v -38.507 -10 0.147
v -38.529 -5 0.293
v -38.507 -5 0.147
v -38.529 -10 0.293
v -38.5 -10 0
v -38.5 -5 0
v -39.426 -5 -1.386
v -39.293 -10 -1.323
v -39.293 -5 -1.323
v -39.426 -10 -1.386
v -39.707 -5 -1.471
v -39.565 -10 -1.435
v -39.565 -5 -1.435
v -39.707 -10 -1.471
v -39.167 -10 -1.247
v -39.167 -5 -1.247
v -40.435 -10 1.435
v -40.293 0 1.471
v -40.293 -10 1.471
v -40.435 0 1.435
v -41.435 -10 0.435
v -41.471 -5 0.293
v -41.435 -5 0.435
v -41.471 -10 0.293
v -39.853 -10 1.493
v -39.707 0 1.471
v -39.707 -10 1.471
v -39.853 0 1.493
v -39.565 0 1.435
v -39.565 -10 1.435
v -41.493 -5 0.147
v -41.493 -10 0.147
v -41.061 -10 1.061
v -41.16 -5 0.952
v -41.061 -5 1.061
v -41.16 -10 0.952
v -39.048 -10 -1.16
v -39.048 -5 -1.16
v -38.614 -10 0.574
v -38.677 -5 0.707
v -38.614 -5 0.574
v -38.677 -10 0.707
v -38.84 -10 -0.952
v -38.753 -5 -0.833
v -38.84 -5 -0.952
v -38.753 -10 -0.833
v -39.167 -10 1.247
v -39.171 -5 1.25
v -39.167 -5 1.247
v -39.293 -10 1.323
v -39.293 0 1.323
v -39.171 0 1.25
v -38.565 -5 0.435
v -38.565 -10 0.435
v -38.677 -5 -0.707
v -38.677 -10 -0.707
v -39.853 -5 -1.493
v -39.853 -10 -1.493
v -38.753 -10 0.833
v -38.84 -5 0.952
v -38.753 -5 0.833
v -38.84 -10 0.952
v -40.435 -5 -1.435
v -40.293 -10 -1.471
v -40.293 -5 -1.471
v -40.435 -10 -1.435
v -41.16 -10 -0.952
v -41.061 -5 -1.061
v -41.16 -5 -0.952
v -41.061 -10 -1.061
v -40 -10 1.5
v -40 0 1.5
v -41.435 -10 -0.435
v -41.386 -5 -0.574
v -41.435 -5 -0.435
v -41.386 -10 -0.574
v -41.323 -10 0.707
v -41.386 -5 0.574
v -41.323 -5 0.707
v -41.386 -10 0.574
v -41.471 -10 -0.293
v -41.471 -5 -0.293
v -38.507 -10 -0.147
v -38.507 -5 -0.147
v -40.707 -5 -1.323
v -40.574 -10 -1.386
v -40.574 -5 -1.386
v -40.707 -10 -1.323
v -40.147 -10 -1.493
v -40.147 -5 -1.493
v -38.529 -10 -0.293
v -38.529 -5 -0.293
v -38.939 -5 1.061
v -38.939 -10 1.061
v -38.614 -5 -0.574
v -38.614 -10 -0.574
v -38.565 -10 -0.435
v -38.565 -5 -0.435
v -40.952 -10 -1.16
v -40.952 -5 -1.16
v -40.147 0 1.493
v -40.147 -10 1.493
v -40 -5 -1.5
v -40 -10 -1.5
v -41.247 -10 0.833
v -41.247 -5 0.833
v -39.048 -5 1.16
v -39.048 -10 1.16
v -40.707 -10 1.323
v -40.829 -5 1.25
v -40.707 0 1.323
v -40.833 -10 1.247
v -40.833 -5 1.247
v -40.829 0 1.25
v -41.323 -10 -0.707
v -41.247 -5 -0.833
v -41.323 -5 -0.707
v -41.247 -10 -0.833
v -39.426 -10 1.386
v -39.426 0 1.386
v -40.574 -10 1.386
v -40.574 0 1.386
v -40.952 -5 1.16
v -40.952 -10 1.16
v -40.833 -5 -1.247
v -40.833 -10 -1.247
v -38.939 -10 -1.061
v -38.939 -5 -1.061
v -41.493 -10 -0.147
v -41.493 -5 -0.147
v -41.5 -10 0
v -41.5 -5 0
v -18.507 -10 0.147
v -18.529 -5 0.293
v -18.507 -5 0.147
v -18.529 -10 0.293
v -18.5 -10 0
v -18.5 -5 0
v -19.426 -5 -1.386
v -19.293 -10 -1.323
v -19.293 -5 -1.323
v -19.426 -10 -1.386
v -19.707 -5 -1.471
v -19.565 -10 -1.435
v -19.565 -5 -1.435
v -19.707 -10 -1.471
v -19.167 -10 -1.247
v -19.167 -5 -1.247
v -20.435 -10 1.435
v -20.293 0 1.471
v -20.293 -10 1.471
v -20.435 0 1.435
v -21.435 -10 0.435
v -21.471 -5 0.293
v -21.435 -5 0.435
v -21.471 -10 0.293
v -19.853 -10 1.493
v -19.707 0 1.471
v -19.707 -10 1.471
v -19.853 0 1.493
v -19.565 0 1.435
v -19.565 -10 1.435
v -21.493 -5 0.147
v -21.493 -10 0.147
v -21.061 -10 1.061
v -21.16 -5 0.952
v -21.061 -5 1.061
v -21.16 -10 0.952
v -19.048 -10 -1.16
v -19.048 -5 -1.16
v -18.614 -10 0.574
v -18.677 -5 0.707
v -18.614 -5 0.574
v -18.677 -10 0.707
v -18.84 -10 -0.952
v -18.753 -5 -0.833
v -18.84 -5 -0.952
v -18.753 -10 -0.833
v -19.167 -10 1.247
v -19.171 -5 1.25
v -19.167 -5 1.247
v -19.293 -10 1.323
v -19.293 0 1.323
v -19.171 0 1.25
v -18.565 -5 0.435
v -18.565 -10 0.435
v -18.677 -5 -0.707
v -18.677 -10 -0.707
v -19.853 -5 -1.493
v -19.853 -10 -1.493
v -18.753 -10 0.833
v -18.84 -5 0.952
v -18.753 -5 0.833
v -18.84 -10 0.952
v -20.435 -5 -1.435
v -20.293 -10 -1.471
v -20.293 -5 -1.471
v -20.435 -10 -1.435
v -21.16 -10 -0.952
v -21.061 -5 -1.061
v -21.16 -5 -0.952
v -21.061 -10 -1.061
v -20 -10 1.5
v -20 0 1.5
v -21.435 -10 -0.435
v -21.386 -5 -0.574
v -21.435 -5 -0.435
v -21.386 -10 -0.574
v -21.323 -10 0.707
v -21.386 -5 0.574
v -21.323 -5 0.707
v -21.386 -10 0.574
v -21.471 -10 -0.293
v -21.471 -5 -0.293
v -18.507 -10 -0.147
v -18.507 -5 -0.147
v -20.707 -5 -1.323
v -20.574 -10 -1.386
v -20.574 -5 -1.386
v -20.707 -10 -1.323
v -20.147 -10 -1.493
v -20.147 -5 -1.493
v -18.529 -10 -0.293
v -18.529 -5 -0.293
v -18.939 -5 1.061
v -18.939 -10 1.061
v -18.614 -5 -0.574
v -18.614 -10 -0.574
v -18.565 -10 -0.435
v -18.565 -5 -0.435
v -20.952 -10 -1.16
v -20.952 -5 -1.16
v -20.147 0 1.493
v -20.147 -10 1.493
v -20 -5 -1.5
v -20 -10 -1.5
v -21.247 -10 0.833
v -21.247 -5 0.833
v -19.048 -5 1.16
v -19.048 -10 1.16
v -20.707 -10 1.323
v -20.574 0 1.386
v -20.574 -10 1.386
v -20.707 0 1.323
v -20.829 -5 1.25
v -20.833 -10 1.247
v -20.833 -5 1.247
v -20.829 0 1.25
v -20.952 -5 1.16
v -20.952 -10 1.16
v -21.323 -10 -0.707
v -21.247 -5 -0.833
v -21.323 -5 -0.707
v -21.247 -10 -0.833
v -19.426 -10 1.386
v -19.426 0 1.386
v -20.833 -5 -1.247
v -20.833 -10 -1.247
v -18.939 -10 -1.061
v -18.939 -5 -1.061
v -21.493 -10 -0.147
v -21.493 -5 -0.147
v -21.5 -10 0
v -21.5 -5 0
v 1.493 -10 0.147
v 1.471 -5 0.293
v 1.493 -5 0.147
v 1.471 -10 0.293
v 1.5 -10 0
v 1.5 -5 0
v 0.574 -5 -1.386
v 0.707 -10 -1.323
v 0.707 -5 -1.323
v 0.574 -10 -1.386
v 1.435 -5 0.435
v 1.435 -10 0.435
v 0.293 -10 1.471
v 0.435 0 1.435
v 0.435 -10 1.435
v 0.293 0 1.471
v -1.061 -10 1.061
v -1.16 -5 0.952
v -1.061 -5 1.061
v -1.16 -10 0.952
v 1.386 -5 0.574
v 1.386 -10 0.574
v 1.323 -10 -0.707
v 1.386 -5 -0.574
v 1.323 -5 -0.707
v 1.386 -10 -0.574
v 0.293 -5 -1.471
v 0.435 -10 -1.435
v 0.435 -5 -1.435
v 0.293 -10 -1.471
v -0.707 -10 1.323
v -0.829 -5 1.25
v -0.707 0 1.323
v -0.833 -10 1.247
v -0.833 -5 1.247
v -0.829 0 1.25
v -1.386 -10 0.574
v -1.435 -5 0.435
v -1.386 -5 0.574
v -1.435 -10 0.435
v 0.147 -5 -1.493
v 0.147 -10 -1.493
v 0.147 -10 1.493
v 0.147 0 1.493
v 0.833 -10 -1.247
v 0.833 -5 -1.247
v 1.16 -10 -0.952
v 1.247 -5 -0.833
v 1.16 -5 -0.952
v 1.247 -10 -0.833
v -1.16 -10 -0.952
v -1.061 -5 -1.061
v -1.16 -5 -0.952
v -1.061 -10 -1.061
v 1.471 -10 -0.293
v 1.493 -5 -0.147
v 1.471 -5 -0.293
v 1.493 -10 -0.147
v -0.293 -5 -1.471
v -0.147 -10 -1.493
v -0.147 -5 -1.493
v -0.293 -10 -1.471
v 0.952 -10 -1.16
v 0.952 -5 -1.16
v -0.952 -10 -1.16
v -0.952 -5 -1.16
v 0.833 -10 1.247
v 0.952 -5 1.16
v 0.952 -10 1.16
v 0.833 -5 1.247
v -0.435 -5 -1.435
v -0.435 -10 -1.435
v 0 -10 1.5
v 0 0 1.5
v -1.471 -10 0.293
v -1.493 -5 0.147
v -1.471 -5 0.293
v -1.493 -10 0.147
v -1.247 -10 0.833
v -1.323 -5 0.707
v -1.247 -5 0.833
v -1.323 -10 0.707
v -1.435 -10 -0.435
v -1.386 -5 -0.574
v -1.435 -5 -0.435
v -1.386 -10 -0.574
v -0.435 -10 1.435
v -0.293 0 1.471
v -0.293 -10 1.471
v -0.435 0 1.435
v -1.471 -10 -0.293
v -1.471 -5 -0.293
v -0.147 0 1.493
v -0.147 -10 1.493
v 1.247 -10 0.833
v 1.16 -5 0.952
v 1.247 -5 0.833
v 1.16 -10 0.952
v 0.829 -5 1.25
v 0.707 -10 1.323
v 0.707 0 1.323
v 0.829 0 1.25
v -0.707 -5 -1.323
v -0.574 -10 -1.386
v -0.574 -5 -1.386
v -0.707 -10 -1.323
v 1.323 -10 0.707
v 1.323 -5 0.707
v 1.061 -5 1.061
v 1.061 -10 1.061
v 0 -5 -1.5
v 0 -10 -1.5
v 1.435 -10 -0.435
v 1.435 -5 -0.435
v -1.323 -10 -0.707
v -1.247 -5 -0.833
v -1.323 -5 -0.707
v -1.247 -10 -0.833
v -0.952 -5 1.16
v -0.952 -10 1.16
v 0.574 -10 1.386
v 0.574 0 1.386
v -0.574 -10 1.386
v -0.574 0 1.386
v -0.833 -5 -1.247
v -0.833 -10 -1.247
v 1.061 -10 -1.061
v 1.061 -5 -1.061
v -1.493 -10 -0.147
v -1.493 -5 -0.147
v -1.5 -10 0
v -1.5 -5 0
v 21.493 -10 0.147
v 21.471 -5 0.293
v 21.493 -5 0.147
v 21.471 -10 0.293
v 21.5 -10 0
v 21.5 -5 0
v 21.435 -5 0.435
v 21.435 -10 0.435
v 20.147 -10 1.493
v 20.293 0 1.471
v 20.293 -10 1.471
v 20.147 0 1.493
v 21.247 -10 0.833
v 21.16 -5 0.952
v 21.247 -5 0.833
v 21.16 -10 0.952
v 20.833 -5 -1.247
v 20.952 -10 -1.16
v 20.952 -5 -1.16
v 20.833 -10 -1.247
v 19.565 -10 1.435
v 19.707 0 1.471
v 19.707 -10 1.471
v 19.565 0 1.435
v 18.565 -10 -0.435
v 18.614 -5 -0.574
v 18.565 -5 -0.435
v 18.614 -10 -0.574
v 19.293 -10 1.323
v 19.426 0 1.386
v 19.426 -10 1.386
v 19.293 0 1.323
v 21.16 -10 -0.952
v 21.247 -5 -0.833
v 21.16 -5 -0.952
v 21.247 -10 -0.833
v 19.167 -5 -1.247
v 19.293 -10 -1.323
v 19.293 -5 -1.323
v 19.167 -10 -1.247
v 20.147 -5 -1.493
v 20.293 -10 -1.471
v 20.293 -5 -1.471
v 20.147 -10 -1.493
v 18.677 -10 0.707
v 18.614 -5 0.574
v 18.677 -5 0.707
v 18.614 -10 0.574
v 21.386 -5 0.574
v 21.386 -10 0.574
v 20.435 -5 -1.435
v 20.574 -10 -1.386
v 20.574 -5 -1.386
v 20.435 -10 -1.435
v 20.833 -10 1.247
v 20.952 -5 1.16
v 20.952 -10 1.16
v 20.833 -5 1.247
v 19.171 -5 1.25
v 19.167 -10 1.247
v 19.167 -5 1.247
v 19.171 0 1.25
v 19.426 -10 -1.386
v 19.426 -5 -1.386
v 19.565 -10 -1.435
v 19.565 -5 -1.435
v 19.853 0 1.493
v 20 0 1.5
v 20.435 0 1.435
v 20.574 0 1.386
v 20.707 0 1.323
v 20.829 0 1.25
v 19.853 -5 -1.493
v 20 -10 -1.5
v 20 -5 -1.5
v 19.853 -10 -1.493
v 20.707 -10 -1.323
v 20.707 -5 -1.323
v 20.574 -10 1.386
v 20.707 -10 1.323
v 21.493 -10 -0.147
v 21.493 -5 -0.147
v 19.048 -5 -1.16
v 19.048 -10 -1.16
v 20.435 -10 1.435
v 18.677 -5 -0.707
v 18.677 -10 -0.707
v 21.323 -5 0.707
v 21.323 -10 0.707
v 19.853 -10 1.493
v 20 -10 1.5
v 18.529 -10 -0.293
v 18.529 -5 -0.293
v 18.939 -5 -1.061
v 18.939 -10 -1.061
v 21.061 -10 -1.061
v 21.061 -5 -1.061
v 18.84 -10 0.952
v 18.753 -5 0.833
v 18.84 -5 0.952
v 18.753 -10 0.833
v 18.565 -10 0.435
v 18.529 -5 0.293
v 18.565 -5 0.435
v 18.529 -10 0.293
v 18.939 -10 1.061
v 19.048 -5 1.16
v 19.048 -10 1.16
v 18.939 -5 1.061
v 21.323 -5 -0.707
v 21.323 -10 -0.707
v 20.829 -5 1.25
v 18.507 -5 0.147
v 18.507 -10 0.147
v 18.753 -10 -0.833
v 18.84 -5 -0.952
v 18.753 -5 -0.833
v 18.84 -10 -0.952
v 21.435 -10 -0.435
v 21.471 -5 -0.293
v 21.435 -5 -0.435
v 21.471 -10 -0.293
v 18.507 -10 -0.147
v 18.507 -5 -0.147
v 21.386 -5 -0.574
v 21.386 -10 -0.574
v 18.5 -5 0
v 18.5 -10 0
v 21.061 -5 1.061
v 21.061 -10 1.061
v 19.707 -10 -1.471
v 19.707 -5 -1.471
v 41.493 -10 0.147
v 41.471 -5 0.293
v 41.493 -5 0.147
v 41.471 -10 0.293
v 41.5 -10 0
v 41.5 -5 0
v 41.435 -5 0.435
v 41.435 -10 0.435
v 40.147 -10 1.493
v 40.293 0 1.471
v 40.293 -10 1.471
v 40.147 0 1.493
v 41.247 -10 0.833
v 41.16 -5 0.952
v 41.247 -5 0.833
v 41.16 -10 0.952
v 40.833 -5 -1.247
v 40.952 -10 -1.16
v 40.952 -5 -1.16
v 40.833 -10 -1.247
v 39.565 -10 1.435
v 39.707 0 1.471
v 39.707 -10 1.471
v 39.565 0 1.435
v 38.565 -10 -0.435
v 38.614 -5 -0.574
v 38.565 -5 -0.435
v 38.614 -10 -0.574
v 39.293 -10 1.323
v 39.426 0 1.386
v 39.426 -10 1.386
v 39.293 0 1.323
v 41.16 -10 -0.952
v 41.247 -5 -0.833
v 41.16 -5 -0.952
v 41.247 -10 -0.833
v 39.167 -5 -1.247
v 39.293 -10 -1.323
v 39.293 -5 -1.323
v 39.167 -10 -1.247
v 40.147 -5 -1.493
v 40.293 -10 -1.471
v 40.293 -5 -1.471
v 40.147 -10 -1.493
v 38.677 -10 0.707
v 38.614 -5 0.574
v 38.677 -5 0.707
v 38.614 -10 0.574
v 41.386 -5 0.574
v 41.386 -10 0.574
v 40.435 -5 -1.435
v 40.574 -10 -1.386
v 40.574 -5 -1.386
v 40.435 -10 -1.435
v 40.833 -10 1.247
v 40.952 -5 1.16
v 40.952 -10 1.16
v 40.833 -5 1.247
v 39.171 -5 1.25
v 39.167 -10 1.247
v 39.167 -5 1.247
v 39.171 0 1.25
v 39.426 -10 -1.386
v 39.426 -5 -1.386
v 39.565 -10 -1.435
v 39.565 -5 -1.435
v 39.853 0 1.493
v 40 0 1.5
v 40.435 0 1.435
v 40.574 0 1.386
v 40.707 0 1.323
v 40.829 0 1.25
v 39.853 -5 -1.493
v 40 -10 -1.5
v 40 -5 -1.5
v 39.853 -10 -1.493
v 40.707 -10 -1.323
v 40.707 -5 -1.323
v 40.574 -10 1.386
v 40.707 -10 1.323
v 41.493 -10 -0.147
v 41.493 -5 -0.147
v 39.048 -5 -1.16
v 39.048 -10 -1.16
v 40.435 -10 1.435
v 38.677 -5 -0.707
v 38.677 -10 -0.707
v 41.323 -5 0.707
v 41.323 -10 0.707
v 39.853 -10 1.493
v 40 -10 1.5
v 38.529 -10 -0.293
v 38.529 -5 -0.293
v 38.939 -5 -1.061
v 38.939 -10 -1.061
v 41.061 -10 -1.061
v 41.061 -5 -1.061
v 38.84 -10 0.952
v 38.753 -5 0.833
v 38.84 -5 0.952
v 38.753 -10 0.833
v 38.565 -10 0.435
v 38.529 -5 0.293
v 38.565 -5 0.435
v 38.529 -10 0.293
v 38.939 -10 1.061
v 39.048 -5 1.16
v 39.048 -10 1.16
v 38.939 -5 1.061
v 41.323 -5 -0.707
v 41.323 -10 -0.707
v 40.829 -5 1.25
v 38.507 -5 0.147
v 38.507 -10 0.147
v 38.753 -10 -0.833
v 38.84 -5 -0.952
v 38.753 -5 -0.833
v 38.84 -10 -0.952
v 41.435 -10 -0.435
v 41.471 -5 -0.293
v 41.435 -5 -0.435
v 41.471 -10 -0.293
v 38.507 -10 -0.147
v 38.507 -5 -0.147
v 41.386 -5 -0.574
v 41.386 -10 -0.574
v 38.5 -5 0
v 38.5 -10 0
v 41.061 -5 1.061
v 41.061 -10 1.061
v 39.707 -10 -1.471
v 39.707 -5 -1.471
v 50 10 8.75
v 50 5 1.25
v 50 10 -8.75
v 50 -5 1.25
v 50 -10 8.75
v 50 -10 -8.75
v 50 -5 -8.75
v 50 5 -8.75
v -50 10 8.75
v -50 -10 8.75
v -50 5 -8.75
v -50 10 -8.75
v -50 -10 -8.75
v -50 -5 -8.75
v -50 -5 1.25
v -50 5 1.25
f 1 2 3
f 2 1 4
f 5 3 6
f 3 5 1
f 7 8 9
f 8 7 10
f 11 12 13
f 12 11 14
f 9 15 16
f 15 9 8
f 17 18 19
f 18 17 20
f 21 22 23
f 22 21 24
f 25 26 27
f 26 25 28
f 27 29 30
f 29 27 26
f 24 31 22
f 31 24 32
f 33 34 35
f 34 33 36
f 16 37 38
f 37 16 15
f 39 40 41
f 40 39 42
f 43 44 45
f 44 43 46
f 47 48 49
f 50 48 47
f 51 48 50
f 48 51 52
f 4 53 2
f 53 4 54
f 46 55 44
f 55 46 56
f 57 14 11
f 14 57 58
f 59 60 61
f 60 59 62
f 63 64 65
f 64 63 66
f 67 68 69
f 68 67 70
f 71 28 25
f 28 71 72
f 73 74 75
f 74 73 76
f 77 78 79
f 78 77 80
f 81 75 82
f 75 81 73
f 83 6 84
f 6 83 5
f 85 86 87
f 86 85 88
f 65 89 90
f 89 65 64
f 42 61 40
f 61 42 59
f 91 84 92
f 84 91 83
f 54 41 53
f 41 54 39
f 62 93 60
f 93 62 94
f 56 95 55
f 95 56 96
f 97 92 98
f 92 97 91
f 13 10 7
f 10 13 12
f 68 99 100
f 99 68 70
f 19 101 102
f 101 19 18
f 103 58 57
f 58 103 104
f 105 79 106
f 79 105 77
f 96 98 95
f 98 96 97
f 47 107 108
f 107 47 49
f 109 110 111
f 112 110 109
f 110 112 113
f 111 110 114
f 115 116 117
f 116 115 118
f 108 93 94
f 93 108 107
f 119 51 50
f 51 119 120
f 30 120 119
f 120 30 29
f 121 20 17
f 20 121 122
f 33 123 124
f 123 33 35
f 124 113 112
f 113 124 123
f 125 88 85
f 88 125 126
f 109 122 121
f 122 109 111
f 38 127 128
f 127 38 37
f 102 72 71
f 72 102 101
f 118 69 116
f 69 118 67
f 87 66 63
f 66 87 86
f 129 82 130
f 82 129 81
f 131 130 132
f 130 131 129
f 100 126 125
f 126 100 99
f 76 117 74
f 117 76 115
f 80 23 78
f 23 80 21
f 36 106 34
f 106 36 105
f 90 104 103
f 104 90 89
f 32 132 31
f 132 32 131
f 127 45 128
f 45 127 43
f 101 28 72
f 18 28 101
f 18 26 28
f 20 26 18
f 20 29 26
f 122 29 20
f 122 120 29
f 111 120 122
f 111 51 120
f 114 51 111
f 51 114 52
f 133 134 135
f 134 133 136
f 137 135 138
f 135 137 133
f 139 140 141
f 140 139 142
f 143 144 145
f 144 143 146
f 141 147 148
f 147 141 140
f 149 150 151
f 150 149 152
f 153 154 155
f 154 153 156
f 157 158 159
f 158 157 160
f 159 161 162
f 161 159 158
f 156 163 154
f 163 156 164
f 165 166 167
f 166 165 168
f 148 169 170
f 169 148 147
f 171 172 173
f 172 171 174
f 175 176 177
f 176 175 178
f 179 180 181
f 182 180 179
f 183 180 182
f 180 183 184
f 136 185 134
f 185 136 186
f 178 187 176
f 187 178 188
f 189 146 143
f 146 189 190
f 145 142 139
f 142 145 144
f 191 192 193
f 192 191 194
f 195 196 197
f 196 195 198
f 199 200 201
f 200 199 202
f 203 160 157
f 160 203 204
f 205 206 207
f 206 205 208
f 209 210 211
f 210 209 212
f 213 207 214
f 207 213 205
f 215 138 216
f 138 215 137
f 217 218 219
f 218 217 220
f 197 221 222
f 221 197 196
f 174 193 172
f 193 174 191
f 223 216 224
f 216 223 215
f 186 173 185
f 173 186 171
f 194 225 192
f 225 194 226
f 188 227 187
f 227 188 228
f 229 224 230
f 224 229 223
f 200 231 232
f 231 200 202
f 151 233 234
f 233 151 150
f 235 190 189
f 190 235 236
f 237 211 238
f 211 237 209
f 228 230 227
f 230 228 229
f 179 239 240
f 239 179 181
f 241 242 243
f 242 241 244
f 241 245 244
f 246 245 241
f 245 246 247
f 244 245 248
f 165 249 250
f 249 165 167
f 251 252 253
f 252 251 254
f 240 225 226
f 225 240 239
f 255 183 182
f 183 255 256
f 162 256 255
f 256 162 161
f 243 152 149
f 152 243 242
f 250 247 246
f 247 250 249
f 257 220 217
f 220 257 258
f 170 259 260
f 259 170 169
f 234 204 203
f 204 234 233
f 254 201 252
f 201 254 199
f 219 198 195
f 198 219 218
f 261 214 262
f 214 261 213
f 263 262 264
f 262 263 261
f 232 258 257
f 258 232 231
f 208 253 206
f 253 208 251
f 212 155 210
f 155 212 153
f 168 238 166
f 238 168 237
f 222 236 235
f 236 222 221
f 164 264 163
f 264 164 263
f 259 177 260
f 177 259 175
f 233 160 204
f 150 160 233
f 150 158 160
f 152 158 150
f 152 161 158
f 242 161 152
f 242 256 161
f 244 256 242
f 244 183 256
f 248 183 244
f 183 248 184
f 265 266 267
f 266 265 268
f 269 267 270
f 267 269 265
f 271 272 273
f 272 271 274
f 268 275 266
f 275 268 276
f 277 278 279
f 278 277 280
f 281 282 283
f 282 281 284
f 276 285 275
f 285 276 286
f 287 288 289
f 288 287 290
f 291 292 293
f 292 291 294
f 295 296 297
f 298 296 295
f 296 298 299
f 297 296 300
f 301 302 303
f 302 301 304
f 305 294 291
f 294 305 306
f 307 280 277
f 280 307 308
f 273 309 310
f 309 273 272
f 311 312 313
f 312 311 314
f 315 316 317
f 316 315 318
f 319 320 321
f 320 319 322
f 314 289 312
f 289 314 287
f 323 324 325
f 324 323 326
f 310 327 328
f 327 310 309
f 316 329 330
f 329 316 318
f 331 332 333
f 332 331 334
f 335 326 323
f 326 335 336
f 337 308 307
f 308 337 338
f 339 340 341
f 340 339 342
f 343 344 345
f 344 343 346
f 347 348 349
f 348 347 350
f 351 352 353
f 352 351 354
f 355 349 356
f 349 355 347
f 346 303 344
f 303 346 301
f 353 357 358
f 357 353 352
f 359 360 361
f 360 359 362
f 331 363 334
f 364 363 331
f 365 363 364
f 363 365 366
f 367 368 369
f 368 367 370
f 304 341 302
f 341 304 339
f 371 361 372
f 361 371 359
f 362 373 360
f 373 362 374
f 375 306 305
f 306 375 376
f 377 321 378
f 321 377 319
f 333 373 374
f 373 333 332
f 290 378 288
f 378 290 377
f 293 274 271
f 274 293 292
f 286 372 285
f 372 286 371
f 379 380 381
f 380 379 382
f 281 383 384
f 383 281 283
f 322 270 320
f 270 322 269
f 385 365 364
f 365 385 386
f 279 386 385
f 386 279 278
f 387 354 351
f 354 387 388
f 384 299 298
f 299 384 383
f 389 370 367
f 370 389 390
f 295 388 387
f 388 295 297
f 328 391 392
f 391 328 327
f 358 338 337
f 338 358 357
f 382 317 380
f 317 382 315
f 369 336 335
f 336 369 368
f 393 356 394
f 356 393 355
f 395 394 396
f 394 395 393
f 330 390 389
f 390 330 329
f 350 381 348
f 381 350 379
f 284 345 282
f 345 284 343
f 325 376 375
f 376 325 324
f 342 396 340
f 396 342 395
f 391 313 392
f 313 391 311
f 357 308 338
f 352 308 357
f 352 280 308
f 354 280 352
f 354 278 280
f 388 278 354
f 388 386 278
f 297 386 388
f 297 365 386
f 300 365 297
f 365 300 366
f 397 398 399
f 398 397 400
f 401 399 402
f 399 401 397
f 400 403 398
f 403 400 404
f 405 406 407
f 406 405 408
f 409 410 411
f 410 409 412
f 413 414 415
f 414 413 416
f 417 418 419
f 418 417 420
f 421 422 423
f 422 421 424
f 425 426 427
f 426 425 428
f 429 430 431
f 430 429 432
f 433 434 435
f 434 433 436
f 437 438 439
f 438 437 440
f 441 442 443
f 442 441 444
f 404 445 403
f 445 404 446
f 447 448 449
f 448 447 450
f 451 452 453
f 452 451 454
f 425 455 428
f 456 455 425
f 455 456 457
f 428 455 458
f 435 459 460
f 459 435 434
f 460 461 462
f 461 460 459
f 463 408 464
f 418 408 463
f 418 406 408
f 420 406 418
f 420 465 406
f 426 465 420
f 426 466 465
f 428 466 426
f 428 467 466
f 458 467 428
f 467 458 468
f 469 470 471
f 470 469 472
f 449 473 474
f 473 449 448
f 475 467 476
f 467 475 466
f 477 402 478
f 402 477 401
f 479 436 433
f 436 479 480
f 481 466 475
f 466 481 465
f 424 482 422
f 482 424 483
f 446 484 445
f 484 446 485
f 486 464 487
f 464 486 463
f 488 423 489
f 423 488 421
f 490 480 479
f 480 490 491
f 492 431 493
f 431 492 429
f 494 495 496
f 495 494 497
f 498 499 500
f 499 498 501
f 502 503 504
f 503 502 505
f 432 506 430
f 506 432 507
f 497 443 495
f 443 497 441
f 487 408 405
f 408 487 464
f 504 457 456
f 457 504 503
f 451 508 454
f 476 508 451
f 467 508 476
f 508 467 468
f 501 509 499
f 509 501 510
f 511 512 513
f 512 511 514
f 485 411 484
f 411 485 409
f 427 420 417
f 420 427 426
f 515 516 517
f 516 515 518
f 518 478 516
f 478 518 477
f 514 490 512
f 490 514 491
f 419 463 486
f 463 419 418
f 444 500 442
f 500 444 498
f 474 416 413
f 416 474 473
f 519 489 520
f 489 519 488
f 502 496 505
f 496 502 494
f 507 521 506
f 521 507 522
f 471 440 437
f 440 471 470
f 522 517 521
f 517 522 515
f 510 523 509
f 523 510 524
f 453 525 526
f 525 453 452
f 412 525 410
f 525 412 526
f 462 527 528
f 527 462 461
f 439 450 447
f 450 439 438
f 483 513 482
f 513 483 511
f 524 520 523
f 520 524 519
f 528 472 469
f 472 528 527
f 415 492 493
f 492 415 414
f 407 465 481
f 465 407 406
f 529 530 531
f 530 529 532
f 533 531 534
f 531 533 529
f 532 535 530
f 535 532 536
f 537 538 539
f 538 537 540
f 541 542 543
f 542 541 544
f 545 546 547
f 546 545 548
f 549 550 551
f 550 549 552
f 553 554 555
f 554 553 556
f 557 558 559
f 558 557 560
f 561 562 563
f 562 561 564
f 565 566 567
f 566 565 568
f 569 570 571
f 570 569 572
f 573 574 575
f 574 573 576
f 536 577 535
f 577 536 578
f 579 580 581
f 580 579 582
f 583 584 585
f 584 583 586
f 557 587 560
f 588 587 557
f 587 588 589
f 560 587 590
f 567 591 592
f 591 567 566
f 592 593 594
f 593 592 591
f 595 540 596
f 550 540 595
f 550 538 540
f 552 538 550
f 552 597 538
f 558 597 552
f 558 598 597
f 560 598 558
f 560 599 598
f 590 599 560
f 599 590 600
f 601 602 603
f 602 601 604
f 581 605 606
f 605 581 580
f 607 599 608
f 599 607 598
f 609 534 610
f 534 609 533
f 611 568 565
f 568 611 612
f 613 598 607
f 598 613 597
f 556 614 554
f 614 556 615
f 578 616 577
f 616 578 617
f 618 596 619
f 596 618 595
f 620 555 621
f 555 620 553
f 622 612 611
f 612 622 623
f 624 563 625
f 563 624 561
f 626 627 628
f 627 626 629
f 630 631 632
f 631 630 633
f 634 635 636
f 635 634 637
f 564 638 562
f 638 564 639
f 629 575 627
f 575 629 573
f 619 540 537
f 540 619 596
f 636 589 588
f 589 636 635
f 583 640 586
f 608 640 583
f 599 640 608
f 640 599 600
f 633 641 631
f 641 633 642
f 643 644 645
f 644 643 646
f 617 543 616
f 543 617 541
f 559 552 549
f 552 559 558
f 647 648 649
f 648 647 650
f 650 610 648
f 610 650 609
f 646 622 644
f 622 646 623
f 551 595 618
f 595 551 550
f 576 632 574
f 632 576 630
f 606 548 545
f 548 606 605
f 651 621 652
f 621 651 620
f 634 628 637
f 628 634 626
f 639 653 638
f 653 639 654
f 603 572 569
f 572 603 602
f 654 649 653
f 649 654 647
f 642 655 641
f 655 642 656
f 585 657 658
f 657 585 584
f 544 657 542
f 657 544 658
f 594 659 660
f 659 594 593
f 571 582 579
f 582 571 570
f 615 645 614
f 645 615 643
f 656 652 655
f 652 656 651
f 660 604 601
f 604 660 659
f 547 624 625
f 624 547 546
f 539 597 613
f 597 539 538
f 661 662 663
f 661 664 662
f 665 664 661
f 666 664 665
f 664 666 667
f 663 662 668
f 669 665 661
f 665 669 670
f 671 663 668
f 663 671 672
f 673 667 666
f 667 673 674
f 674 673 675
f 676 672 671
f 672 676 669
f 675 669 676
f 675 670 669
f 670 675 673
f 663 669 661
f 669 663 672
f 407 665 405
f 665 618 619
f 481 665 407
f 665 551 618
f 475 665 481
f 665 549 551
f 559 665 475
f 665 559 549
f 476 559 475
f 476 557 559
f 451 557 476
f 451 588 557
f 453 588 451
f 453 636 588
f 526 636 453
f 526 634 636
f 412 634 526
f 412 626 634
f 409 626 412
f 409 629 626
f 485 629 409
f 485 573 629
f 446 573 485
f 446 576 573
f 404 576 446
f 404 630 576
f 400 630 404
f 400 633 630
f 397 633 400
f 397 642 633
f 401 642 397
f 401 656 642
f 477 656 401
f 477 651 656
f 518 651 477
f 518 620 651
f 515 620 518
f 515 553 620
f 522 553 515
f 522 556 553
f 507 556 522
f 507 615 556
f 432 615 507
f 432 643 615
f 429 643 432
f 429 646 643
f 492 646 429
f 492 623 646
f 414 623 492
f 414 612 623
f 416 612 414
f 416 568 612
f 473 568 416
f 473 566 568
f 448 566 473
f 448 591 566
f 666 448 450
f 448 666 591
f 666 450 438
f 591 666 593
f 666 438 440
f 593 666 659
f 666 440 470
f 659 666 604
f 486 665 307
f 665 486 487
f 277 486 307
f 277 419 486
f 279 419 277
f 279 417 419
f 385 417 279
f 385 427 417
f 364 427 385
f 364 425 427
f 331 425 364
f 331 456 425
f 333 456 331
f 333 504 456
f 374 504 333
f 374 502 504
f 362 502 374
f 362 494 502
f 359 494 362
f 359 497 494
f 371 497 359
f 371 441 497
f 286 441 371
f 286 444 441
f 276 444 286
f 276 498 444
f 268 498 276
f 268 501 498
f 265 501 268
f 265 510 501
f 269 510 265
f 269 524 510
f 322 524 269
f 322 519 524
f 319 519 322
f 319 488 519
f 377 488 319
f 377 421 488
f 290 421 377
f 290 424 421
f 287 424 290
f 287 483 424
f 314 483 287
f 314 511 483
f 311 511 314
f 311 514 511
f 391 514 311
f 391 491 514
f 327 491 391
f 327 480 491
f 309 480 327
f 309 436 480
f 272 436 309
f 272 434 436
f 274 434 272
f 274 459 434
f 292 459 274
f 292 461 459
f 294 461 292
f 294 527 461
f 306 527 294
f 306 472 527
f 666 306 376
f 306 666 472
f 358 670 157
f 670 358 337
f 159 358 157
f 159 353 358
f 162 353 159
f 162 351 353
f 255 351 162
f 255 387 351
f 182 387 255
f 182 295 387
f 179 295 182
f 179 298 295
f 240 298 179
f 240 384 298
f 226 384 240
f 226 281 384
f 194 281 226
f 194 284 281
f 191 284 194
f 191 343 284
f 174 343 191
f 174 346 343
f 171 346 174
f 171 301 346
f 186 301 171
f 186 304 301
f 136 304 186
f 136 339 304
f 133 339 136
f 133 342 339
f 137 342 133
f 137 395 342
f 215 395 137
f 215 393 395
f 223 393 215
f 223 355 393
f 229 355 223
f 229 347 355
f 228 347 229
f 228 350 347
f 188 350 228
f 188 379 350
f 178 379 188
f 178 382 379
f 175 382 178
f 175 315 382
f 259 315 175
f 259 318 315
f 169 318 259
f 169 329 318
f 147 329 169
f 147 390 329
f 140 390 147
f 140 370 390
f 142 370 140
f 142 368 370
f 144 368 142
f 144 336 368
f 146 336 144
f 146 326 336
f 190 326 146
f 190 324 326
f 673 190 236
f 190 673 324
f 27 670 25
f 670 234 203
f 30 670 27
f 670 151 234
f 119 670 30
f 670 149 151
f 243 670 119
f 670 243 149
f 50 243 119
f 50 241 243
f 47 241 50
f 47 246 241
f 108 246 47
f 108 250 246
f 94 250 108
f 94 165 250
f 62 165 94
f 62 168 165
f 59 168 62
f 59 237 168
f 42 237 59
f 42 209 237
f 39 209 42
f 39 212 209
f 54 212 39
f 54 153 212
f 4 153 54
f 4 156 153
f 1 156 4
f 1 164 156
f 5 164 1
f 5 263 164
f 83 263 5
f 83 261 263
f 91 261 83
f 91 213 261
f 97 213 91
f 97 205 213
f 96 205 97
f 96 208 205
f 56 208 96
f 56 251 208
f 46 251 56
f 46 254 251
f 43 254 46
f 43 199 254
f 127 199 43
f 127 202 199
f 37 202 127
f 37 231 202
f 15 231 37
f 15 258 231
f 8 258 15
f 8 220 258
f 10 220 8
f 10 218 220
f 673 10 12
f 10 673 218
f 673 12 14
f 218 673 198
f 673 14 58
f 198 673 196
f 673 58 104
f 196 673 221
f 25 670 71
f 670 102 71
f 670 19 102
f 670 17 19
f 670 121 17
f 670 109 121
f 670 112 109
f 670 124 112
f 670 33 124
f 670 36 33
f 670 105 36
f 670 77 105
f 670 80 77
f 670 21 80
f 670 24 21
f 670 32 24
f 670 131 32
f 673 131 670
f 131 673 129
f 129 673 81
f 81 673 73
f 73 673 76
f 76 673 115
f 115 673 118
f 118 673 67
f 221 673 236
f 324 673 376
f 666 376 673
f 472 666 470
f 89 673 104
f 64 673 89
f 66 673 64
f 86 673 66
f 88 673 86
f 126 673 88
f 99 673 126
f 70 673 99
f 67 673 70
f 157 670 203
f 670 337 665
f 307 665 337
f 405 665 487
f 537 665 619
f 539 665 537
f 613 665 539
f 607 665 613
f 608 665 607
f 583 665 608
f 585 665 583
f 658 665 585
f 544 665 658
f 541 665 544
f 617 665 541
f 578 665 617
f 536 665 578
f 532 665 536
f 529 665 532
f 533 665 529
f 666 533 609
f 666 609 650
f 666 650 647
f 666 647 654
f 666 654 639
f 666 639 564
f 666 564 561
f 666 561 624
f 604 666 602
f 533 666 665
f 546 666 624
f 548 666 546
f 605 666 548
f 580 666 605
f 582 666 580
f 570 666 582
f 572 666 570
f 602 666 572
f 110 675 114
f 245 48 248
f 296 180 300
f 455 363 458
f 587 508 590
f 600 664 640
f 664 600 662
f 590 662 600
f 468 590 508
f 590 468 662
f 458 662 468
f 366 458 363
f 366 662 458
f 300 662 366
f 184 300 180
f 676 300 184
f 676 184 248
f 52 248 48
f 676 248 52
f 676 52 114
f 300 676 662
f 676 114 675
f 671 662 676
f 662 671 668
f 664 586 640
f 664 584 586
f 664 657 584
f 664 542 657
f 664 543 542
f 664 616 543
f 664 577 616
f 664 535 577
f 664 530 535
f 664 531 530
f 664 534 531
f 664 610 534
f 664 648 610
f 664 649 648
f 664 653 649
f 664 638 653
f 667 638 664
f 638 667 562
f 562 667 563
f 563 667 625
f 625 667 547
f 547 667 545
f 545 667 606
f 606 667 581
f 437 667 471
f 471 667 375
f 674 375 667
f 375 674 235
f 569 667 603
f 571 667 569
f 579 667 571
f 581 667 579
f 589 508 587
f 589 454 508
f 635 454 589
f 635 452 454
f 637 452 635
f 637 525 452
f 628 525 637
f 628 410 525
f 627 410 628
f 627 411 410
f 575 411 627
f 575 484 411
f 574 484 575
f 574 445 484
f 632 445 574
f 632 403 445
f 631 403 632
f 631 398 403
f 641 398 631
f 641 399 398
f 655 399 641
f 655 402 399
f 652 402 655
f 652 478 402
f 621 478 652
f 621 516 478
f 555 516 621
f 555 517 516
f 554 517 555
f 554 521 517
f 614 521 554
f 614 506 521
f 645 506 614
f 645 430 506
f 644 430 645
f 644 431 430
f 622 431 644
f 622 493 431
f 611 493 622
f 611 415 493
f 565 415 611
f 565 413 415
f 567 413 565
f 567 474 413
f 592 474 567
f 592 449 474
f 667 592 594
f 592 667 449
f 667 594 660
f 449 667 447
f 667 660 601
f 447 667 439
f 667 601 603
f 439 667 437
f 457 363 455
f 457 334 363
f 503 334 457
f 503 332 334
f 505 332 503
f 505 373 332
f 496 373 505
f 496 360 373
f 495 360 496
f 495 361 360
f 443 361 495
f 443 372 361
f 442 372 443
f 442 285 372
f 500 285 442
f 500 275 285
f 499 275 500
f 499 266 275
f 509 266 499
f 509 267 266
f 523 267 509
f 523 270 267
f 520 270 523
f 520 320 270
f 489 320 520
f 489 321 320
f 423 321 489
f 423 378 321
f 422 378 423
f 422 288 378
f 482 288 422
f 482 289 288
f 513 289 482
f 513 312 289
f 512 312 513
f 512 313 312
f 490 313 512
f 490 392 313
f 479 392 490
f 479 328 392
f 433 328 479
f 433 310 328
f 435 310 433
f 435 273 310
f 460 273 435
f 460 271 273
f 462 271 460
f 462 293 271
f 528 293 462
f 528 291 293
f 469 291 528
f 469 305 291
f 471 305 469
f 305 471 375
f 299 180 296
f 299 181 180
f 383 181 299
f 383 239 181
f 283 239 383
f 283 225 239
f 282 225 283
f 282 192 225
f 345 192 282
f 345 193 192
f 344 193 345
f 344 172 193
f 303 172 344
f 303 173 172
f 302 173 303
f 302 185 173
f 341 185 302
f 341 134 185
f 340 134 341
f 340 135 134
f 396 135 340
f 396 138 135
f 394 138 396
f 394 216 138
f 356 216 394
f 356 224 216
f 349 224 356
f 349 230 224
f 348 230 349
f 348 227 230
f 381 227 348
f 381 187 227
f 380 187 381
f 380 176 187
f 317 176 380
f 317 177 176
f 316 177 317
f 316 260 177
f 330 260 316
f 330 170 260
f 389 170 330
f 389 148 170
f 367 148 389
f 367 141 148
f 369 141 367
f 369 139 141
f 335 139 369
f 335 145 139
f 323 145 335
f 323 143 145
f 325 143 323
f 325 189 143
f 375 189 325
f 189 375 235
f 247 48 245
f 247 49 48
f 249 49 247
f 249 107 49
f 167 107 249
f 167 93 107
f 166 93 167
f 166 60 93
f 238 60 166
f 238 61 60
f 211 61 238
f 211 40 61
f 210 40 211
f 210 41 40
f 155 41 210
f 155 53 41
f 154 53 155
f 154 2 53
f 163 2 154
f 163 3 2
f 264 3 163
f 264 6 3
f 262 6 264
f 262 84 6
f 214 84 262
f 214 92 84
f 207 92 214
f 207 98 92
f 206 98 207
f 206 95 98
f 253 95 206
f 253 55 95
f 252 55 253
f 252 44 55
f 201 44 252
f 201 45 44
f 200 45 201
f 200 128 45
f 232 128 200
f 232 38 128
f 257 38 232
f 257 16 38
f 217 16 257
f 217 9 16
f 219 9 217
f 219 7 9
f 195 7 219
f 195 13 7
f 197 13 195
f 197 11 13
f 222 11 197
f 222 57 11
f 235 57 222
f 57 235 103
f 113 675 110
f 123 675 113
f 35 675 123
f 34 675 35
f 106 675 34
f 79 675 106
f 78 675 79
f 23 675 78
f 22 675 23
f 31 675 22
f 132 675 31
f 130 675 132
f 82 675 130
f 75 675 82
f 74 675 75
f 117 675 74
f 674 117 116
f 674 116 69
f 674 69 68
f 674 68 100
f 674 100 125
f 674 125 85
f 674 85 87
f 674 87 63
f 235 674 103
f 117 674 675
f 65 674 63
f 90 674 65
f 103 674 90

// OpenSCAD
module linear_guide_rail() {
    difference() {
        // Main body of the rail
        translate([-50, -10, -8.75])
            cube([100, 20, 17.5]);
        
        // Cutout for the rail groove
        translate([-50, -5, -8.75])
            cube([100, 10, 10]);
        
        // Holes for mounting
        for (x = [-40, -20, 0, 20, 40]) {
            translate([x, 0, 0])
                rotate([90, 0, 0])
                    cylinder(h=20, r=1.5, $fn=64);
        }
    }
}

linear_guide_rail();
